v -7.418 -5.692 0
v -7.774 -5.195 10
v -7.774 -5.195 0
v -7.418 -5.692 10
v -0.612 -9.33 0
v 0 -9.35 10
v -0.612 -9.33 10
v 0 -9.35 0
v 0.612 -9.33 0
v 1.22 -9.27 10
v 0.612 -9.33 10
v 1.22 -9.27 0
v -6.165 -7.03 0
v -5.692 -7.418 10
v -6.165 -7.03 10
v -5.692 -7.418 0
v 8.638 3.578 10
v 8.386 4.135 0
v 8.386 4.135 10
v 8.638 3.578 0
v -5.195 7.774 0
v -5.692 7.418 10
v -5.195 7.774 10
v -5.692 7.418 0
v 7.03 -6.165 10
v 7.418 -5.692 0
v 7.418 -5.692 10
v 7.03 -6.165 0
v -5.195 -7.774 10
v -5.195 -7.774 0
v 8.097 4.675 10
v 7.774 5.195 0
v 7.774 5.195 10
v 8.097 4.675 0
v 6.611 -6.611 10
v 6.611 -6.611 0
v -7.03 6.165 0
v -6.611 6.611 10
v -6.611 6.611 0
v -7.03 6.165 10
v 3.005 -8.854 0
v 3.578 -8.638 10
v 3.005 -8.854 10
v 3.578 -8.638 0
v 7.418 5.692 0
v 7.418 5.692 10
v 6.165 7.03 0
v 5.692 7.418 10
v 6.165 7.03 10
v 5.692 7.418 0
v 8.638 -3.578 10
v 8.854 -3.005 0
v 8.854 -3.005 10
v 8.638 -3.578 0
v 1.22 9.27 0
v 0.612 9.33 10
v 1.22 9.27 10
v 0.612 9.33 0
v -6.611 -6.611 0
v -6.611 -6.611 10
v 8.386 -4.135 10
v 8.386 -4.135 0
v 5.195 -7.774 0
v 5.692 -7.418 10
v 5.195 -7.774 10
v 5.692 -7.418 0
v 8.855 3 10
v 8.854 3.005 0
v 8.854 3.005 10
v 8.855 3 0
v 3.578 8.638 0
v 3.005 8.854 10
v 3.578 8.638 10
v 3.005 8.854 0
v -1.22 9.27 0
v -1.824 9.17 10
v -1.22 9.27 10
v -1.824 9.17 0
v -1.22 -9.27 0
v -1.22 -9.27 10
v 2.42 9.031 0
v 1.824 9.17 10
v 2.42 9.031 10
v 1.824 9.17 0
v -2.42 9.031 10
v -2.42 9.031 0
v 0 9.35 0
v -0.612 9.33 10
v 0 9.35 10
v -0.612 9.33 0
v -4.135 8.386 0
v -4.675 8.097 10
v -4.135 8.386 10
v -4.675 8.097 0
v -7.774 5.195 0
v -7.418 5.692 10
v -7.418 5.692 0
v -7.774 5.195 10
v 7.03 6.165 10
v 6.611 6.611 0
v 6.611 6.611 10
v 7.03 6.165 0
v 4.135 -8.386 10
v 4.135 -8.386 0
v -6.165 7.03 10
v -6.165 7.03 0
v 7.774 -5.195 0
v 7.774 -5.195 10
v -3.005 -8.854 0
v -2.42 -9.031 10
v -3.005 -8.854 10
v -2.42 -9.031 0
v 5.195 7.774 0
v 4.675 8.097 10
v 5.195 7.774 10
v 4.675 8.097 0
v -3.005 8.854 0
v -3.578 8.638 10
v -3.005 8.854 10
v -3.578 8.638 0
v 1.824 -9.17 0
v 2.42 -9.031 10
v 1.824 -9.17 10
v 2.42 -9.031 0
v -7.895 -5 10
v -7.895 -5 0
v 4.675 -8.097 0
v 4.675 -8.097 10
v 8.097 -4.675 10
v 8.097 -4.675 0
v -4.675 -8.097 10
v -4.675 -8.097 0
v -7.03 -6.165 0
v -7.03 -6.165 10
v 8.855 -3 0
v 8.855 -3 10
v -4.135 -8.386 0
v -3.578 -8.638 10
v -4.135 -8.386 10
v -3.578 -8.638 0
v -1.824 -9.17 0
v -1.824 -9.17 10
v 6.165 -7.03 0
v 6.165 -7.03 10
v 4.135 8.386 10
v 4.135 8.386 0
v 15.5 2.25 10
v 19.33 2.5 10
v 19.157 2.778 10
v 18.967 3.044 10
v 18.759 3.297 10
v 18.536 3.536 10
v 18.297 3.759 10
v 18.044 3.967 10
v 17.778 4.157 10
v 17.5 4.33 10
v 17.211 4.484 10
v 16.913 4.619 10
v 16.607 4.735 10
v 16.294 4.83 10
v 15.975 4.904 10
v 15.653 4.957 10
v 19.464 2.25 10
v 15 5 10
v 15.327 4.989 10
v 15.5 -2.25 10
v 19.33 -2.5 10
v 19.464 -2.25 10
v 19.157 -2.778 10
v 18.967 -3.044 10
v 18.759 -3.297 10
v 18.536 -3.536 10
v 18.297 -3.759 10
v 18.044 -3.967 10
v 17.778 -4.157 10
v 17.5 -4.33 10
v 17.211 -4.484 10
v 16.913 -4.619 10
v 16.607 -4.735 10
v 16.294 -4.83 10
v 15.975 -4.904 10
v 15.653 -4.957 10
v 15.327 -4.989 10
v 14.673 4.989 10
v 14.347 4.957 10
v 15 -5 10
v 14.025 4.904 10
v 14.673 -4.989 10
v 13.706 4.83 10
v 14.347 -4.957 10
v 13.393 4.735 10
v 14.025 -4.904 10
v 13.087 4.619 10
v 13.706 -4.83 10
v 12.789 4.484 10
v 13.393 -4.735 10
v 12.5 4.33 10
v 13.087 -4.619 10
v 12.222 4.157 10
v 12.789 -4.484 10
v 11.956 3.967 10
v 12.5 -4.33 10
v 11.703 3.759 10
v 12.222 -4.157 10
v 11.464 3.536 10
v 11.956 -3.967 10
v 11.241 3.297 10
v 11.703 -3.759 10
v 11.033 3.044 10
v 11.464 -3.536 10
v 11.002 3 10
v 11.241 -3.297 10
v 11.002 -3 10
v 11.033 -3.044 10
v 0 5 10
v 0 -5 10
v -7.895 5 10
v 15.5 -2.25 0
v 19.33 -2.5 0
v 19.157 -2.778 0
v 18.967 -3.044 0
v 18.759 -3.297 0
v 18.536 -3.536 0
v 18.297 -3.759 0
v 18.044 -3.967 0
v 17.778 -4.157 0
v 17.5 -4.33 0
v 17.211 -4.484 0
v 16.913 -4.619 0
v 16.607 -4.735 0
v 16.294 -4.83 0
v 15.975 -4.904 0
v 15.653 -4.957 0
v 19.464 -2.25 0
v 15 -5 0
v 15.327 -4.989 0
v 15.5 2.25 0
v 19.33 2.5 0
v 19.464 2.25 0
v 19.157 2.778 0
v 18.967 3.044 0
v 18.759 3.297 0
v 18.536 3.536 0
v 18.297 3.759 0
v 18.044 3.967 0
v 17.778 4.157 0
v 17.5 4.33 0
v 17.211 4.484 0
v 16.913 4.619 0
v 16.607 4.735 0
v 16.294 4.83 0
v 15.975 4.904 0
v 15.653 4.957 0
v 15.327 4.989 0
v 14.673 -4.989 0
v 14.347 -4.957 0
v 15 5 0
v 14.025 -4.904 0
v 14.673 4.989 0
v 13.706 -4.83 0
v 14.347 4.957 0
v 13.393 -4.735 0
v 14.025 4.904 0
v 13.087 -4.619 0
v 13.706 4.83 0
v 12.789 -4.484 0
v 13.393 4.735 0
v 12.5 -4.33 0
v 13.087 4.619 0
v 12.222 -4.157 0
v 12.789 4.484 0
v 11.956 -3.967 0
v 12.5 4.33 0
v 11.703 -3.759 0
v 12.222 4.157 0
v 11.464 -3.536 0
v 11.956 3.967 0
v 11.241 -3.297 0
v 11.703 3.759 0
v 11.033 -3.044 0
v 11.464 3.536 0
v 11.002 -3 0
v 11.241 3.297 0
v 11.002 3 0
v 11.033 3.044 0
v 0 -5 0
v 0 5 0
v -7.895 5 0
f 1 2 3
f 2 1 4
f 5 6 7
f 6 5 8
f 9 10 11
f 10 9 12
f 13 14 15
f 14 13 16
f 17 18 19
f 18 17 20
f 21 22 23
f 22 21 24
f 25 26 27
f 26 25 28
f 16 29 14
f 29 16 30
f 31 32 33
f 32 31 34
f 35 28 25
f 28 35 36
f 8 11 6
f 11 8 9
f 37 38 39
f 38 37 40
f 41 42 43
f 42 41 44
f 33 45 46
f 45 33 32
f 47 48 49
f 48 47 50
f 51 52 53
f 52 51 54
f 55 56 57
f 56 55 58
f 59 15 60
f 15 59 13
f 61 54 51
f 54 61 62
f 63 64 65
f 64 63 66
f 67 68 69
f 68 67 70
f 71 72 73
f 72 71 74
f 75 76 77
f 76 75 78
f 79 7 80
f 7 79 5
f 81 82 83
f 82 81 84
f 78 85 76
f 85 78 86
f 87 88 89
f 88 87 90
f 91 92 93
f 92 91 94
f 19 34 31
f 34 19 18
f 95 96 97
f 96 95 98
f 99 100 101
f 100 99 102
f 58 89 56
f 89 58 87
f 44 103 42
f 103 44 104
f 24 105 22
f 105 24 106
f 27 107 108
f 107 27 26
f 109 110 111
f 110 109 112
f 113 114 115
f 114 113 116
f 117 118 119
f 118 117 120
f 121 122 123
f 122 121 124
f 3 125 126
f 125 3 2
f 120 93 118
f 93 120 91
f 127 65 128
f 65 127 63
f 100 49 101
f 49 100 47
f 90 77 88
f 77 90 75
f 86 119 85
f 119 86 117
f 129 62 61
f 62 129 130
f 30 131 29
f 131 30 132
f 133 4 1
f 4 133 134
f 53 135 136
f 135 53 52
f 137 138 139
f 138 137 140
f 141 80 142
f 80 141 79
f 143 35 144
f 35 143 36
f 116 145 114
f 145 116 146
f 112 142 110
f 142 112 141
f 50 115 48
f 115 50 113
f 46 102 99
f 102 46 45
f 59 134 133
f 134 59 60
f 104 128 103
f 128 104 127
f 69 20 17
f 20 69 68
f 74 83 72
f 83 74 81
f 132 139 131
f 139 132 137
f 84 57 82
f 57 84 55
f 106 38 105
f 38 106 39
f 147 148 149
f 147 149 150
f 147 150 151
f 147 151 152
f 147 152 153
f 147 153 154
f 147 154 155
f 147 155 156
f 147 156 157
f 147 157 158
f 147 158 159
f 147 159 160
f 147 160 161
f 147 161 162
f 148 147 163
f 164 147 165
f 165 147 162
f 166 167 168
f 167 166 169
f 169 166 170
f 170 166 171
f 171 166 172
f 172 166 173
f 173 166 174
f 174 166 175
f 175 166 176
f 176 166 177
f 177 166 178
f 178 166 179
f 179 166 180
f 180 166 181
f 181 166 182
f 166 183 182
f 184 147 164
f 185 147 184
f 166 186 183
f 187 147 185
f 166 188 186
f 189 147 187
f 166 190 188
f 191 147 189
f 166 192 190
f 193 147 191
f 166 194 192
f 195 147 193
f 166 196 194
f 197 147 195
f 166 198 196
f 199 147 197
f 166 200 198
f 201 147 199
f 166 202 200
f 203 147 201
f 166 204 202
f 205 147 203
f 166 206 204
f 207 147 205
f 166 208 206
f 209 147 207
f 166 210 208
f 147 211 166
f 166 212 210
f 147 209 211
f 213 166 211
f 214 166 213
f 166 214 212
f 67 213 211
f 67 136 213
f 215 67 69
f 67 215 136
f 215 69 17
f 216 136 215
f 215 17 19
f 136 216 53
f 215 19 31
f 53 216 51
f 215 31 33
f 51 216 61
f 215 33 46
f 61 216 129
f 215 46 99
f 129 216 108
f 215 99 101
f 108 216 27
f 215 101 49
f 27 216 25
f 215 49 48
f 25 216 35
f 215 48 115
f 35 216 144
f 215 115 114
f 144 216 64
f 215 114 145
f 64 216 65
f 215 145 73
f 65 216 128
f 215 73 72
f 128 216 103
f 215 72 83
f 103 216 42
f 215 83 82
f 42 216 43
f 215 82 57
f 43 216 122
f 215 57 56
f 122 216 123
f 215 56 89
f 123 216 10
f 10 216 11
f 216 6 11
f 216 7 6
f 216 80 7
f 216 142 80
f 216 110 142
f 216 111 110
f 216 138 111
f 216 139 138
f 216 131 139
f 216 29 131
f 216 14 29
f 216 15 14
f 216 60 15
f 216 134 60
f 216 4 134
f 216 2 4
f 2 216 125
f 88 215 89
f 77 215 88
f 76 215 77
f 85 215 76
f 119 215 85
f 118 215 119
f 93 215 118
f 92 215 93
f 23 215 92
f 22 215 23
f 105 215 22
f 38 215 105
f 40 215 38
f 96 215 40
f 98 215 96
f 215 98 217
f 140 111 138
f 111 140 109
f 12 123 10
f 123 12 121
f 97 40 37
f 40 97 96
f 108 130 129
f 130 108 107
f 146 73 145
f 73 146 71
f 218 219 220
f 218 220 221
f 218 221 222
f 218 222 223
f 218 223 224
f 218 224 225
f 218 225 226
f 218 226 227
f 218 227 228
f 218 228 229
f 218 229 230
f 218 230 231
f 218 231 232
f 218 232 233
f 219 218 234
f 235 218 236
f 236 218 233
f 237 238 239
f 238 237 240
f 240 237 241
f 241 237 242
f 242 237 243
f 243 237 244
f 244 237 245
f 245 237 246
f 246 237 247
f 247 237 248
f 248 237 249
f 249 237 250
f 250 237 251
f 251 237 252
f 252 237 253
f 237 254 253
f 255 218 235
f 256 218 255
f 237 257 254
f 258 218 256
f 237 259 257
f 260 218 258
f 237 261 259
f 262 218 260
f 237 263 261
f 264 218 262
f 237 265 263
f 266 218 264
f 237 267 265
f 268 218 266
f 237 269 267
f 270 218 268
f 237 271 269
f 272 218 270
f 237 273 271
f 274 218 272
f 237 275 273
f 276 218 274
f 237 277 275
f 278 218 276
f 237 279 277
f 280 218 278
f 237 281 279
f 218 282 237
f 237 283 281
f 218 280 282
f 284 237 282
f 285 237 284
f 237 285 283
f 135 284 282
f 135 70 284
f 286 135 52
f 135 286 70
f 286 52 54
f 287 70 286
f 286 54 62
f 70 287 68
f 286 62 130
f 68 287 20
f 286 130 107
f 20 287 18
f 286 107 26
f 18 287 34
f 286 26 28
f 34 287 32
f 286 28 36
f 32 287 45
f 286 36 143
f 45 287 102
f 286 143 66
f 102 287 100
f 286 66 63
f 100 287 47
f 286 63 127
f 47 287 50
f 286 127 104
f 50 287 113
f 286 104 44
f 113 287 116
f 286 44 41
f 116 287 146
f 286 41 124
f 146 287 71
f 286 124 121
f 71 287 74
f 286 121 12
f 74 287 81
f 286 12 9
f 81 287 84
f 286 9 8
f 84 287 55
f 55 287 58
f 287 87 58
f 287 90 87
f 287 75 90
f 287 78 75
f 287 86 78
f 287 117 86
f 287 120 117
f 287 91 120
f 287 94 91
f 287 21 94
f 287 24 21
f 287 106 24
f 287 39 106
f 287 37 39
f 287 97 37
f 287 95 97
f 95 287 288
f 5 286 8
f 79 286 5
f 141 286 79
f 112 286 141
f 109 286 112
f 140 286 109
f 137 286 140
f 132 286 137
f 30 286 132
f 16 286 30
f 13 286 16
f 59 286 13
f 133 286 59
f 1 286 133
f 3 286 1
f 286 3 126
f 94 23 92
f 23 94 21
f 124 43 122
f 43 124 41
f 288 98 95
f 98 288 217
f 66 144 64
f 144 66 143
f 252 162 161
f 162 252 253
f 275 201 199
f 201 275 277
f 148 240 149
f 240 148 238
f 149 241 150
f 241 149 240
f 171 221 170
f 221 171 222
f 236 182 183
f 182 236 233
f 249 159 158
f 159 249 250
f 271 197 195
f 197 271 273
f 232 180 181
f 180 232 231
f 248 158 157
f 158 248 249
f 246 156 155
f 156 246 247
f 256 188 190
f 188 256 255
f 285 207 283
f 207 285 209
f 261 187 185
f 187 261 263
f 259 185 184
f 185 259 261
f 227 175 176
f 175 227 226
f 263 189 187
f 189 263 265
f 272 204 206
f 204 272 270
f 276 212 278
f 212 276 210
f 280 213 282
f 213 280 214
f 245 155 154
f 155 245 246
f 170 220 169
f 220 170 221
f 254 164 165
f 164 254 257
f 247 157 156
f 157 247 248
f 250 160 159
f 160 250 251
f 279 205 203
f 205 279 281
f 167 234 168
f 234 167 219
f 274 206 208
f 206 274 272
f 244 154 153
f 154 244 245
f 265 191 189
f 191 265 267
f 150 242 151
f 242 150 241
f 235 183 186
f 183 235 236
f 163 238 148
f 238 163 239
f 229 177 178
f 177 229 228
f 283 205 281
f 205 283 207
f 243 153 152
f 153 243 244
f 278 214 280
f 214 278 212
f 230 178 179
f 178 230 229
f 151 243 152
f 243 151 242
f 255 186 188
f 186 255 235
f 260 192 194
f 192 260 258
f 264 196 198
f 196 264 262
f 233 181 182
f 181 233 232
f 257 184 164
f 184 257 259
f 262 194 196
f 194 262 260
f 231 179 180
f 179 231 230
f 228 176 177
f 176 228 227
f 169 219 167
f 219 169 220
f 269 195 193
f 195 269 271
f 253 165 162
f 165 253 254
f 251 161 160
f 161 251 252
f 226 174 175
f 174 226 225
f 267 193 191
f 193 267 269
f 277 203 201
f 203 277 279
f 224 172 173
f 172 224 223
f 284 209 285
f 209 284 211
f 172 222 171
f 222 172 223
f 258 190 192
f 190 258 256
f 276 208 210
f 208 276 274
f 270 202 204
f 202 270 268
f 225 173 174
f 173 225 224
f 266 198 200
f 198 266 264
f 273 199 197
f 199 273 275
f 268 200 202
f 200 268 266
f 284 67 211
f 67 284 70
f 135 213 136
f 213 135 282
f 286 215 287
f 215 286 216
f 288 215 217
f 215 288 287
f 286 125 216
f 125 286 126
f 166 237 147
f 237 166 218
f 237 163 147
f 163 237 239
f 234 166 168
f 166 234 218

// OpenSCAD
// Tubing clip for 12.7 mm lab stand rod
// Print orientation: flat on bed, extrusion builds up in +Z

$fn = 96;

// ---- Dimensions (mm) ----
rod_d      = 12.7;   // rod diameter
ring_w     = 3;      // rod ring wall thickness
rod_r      = rod_d/2 + ring_w;  // rod ring outer radius (18.7/2)
opening    = 10;     // rod ring opening width along -X
t_ring_i   = 6;      // tubing ring inner diameter
t_ring_w   = 2;      // tubing ring wall thickness
t_ring_r   = t_ring_i/2 + t_ring_w;  // tubing ring outer radius
t_opening  = 4.5;    // tubing ring opening width along +X
bridge_x1  = 8;      // bridge start (X)
bridge_x2  = 12;     // bridge end (X)
bridge_w   = 6;      // bridge width (Y)
h          = 10;     // extrusion height (Z)
eps        = 0.5;    // cutter overshoot

difference() {
    union() {
        // Rod ring
        cylinder(r = rod_r, h = h);
        // Tubing ring
        translate([15, 0, 0])
            cylinder(r = t_ring_r, h = h);
        // Bridge
        translate([bridge_x1, -bridge_w/2, 0])
            cube([bridge_x2 - bridge_x1, bridge_w, h]);
    }
    // Rod ring opening (-X side)
    translate([-rod_r - eps, -opening/2, 0])
        cube([rod_r + eps, opening, h + 2*eps]);
    // Tubing ring opening (+X side)
    translate([15 + eps, -t_opening/2, 0])
        cube([rod_r + eps, t_opening, h + 2*eps]);
}
